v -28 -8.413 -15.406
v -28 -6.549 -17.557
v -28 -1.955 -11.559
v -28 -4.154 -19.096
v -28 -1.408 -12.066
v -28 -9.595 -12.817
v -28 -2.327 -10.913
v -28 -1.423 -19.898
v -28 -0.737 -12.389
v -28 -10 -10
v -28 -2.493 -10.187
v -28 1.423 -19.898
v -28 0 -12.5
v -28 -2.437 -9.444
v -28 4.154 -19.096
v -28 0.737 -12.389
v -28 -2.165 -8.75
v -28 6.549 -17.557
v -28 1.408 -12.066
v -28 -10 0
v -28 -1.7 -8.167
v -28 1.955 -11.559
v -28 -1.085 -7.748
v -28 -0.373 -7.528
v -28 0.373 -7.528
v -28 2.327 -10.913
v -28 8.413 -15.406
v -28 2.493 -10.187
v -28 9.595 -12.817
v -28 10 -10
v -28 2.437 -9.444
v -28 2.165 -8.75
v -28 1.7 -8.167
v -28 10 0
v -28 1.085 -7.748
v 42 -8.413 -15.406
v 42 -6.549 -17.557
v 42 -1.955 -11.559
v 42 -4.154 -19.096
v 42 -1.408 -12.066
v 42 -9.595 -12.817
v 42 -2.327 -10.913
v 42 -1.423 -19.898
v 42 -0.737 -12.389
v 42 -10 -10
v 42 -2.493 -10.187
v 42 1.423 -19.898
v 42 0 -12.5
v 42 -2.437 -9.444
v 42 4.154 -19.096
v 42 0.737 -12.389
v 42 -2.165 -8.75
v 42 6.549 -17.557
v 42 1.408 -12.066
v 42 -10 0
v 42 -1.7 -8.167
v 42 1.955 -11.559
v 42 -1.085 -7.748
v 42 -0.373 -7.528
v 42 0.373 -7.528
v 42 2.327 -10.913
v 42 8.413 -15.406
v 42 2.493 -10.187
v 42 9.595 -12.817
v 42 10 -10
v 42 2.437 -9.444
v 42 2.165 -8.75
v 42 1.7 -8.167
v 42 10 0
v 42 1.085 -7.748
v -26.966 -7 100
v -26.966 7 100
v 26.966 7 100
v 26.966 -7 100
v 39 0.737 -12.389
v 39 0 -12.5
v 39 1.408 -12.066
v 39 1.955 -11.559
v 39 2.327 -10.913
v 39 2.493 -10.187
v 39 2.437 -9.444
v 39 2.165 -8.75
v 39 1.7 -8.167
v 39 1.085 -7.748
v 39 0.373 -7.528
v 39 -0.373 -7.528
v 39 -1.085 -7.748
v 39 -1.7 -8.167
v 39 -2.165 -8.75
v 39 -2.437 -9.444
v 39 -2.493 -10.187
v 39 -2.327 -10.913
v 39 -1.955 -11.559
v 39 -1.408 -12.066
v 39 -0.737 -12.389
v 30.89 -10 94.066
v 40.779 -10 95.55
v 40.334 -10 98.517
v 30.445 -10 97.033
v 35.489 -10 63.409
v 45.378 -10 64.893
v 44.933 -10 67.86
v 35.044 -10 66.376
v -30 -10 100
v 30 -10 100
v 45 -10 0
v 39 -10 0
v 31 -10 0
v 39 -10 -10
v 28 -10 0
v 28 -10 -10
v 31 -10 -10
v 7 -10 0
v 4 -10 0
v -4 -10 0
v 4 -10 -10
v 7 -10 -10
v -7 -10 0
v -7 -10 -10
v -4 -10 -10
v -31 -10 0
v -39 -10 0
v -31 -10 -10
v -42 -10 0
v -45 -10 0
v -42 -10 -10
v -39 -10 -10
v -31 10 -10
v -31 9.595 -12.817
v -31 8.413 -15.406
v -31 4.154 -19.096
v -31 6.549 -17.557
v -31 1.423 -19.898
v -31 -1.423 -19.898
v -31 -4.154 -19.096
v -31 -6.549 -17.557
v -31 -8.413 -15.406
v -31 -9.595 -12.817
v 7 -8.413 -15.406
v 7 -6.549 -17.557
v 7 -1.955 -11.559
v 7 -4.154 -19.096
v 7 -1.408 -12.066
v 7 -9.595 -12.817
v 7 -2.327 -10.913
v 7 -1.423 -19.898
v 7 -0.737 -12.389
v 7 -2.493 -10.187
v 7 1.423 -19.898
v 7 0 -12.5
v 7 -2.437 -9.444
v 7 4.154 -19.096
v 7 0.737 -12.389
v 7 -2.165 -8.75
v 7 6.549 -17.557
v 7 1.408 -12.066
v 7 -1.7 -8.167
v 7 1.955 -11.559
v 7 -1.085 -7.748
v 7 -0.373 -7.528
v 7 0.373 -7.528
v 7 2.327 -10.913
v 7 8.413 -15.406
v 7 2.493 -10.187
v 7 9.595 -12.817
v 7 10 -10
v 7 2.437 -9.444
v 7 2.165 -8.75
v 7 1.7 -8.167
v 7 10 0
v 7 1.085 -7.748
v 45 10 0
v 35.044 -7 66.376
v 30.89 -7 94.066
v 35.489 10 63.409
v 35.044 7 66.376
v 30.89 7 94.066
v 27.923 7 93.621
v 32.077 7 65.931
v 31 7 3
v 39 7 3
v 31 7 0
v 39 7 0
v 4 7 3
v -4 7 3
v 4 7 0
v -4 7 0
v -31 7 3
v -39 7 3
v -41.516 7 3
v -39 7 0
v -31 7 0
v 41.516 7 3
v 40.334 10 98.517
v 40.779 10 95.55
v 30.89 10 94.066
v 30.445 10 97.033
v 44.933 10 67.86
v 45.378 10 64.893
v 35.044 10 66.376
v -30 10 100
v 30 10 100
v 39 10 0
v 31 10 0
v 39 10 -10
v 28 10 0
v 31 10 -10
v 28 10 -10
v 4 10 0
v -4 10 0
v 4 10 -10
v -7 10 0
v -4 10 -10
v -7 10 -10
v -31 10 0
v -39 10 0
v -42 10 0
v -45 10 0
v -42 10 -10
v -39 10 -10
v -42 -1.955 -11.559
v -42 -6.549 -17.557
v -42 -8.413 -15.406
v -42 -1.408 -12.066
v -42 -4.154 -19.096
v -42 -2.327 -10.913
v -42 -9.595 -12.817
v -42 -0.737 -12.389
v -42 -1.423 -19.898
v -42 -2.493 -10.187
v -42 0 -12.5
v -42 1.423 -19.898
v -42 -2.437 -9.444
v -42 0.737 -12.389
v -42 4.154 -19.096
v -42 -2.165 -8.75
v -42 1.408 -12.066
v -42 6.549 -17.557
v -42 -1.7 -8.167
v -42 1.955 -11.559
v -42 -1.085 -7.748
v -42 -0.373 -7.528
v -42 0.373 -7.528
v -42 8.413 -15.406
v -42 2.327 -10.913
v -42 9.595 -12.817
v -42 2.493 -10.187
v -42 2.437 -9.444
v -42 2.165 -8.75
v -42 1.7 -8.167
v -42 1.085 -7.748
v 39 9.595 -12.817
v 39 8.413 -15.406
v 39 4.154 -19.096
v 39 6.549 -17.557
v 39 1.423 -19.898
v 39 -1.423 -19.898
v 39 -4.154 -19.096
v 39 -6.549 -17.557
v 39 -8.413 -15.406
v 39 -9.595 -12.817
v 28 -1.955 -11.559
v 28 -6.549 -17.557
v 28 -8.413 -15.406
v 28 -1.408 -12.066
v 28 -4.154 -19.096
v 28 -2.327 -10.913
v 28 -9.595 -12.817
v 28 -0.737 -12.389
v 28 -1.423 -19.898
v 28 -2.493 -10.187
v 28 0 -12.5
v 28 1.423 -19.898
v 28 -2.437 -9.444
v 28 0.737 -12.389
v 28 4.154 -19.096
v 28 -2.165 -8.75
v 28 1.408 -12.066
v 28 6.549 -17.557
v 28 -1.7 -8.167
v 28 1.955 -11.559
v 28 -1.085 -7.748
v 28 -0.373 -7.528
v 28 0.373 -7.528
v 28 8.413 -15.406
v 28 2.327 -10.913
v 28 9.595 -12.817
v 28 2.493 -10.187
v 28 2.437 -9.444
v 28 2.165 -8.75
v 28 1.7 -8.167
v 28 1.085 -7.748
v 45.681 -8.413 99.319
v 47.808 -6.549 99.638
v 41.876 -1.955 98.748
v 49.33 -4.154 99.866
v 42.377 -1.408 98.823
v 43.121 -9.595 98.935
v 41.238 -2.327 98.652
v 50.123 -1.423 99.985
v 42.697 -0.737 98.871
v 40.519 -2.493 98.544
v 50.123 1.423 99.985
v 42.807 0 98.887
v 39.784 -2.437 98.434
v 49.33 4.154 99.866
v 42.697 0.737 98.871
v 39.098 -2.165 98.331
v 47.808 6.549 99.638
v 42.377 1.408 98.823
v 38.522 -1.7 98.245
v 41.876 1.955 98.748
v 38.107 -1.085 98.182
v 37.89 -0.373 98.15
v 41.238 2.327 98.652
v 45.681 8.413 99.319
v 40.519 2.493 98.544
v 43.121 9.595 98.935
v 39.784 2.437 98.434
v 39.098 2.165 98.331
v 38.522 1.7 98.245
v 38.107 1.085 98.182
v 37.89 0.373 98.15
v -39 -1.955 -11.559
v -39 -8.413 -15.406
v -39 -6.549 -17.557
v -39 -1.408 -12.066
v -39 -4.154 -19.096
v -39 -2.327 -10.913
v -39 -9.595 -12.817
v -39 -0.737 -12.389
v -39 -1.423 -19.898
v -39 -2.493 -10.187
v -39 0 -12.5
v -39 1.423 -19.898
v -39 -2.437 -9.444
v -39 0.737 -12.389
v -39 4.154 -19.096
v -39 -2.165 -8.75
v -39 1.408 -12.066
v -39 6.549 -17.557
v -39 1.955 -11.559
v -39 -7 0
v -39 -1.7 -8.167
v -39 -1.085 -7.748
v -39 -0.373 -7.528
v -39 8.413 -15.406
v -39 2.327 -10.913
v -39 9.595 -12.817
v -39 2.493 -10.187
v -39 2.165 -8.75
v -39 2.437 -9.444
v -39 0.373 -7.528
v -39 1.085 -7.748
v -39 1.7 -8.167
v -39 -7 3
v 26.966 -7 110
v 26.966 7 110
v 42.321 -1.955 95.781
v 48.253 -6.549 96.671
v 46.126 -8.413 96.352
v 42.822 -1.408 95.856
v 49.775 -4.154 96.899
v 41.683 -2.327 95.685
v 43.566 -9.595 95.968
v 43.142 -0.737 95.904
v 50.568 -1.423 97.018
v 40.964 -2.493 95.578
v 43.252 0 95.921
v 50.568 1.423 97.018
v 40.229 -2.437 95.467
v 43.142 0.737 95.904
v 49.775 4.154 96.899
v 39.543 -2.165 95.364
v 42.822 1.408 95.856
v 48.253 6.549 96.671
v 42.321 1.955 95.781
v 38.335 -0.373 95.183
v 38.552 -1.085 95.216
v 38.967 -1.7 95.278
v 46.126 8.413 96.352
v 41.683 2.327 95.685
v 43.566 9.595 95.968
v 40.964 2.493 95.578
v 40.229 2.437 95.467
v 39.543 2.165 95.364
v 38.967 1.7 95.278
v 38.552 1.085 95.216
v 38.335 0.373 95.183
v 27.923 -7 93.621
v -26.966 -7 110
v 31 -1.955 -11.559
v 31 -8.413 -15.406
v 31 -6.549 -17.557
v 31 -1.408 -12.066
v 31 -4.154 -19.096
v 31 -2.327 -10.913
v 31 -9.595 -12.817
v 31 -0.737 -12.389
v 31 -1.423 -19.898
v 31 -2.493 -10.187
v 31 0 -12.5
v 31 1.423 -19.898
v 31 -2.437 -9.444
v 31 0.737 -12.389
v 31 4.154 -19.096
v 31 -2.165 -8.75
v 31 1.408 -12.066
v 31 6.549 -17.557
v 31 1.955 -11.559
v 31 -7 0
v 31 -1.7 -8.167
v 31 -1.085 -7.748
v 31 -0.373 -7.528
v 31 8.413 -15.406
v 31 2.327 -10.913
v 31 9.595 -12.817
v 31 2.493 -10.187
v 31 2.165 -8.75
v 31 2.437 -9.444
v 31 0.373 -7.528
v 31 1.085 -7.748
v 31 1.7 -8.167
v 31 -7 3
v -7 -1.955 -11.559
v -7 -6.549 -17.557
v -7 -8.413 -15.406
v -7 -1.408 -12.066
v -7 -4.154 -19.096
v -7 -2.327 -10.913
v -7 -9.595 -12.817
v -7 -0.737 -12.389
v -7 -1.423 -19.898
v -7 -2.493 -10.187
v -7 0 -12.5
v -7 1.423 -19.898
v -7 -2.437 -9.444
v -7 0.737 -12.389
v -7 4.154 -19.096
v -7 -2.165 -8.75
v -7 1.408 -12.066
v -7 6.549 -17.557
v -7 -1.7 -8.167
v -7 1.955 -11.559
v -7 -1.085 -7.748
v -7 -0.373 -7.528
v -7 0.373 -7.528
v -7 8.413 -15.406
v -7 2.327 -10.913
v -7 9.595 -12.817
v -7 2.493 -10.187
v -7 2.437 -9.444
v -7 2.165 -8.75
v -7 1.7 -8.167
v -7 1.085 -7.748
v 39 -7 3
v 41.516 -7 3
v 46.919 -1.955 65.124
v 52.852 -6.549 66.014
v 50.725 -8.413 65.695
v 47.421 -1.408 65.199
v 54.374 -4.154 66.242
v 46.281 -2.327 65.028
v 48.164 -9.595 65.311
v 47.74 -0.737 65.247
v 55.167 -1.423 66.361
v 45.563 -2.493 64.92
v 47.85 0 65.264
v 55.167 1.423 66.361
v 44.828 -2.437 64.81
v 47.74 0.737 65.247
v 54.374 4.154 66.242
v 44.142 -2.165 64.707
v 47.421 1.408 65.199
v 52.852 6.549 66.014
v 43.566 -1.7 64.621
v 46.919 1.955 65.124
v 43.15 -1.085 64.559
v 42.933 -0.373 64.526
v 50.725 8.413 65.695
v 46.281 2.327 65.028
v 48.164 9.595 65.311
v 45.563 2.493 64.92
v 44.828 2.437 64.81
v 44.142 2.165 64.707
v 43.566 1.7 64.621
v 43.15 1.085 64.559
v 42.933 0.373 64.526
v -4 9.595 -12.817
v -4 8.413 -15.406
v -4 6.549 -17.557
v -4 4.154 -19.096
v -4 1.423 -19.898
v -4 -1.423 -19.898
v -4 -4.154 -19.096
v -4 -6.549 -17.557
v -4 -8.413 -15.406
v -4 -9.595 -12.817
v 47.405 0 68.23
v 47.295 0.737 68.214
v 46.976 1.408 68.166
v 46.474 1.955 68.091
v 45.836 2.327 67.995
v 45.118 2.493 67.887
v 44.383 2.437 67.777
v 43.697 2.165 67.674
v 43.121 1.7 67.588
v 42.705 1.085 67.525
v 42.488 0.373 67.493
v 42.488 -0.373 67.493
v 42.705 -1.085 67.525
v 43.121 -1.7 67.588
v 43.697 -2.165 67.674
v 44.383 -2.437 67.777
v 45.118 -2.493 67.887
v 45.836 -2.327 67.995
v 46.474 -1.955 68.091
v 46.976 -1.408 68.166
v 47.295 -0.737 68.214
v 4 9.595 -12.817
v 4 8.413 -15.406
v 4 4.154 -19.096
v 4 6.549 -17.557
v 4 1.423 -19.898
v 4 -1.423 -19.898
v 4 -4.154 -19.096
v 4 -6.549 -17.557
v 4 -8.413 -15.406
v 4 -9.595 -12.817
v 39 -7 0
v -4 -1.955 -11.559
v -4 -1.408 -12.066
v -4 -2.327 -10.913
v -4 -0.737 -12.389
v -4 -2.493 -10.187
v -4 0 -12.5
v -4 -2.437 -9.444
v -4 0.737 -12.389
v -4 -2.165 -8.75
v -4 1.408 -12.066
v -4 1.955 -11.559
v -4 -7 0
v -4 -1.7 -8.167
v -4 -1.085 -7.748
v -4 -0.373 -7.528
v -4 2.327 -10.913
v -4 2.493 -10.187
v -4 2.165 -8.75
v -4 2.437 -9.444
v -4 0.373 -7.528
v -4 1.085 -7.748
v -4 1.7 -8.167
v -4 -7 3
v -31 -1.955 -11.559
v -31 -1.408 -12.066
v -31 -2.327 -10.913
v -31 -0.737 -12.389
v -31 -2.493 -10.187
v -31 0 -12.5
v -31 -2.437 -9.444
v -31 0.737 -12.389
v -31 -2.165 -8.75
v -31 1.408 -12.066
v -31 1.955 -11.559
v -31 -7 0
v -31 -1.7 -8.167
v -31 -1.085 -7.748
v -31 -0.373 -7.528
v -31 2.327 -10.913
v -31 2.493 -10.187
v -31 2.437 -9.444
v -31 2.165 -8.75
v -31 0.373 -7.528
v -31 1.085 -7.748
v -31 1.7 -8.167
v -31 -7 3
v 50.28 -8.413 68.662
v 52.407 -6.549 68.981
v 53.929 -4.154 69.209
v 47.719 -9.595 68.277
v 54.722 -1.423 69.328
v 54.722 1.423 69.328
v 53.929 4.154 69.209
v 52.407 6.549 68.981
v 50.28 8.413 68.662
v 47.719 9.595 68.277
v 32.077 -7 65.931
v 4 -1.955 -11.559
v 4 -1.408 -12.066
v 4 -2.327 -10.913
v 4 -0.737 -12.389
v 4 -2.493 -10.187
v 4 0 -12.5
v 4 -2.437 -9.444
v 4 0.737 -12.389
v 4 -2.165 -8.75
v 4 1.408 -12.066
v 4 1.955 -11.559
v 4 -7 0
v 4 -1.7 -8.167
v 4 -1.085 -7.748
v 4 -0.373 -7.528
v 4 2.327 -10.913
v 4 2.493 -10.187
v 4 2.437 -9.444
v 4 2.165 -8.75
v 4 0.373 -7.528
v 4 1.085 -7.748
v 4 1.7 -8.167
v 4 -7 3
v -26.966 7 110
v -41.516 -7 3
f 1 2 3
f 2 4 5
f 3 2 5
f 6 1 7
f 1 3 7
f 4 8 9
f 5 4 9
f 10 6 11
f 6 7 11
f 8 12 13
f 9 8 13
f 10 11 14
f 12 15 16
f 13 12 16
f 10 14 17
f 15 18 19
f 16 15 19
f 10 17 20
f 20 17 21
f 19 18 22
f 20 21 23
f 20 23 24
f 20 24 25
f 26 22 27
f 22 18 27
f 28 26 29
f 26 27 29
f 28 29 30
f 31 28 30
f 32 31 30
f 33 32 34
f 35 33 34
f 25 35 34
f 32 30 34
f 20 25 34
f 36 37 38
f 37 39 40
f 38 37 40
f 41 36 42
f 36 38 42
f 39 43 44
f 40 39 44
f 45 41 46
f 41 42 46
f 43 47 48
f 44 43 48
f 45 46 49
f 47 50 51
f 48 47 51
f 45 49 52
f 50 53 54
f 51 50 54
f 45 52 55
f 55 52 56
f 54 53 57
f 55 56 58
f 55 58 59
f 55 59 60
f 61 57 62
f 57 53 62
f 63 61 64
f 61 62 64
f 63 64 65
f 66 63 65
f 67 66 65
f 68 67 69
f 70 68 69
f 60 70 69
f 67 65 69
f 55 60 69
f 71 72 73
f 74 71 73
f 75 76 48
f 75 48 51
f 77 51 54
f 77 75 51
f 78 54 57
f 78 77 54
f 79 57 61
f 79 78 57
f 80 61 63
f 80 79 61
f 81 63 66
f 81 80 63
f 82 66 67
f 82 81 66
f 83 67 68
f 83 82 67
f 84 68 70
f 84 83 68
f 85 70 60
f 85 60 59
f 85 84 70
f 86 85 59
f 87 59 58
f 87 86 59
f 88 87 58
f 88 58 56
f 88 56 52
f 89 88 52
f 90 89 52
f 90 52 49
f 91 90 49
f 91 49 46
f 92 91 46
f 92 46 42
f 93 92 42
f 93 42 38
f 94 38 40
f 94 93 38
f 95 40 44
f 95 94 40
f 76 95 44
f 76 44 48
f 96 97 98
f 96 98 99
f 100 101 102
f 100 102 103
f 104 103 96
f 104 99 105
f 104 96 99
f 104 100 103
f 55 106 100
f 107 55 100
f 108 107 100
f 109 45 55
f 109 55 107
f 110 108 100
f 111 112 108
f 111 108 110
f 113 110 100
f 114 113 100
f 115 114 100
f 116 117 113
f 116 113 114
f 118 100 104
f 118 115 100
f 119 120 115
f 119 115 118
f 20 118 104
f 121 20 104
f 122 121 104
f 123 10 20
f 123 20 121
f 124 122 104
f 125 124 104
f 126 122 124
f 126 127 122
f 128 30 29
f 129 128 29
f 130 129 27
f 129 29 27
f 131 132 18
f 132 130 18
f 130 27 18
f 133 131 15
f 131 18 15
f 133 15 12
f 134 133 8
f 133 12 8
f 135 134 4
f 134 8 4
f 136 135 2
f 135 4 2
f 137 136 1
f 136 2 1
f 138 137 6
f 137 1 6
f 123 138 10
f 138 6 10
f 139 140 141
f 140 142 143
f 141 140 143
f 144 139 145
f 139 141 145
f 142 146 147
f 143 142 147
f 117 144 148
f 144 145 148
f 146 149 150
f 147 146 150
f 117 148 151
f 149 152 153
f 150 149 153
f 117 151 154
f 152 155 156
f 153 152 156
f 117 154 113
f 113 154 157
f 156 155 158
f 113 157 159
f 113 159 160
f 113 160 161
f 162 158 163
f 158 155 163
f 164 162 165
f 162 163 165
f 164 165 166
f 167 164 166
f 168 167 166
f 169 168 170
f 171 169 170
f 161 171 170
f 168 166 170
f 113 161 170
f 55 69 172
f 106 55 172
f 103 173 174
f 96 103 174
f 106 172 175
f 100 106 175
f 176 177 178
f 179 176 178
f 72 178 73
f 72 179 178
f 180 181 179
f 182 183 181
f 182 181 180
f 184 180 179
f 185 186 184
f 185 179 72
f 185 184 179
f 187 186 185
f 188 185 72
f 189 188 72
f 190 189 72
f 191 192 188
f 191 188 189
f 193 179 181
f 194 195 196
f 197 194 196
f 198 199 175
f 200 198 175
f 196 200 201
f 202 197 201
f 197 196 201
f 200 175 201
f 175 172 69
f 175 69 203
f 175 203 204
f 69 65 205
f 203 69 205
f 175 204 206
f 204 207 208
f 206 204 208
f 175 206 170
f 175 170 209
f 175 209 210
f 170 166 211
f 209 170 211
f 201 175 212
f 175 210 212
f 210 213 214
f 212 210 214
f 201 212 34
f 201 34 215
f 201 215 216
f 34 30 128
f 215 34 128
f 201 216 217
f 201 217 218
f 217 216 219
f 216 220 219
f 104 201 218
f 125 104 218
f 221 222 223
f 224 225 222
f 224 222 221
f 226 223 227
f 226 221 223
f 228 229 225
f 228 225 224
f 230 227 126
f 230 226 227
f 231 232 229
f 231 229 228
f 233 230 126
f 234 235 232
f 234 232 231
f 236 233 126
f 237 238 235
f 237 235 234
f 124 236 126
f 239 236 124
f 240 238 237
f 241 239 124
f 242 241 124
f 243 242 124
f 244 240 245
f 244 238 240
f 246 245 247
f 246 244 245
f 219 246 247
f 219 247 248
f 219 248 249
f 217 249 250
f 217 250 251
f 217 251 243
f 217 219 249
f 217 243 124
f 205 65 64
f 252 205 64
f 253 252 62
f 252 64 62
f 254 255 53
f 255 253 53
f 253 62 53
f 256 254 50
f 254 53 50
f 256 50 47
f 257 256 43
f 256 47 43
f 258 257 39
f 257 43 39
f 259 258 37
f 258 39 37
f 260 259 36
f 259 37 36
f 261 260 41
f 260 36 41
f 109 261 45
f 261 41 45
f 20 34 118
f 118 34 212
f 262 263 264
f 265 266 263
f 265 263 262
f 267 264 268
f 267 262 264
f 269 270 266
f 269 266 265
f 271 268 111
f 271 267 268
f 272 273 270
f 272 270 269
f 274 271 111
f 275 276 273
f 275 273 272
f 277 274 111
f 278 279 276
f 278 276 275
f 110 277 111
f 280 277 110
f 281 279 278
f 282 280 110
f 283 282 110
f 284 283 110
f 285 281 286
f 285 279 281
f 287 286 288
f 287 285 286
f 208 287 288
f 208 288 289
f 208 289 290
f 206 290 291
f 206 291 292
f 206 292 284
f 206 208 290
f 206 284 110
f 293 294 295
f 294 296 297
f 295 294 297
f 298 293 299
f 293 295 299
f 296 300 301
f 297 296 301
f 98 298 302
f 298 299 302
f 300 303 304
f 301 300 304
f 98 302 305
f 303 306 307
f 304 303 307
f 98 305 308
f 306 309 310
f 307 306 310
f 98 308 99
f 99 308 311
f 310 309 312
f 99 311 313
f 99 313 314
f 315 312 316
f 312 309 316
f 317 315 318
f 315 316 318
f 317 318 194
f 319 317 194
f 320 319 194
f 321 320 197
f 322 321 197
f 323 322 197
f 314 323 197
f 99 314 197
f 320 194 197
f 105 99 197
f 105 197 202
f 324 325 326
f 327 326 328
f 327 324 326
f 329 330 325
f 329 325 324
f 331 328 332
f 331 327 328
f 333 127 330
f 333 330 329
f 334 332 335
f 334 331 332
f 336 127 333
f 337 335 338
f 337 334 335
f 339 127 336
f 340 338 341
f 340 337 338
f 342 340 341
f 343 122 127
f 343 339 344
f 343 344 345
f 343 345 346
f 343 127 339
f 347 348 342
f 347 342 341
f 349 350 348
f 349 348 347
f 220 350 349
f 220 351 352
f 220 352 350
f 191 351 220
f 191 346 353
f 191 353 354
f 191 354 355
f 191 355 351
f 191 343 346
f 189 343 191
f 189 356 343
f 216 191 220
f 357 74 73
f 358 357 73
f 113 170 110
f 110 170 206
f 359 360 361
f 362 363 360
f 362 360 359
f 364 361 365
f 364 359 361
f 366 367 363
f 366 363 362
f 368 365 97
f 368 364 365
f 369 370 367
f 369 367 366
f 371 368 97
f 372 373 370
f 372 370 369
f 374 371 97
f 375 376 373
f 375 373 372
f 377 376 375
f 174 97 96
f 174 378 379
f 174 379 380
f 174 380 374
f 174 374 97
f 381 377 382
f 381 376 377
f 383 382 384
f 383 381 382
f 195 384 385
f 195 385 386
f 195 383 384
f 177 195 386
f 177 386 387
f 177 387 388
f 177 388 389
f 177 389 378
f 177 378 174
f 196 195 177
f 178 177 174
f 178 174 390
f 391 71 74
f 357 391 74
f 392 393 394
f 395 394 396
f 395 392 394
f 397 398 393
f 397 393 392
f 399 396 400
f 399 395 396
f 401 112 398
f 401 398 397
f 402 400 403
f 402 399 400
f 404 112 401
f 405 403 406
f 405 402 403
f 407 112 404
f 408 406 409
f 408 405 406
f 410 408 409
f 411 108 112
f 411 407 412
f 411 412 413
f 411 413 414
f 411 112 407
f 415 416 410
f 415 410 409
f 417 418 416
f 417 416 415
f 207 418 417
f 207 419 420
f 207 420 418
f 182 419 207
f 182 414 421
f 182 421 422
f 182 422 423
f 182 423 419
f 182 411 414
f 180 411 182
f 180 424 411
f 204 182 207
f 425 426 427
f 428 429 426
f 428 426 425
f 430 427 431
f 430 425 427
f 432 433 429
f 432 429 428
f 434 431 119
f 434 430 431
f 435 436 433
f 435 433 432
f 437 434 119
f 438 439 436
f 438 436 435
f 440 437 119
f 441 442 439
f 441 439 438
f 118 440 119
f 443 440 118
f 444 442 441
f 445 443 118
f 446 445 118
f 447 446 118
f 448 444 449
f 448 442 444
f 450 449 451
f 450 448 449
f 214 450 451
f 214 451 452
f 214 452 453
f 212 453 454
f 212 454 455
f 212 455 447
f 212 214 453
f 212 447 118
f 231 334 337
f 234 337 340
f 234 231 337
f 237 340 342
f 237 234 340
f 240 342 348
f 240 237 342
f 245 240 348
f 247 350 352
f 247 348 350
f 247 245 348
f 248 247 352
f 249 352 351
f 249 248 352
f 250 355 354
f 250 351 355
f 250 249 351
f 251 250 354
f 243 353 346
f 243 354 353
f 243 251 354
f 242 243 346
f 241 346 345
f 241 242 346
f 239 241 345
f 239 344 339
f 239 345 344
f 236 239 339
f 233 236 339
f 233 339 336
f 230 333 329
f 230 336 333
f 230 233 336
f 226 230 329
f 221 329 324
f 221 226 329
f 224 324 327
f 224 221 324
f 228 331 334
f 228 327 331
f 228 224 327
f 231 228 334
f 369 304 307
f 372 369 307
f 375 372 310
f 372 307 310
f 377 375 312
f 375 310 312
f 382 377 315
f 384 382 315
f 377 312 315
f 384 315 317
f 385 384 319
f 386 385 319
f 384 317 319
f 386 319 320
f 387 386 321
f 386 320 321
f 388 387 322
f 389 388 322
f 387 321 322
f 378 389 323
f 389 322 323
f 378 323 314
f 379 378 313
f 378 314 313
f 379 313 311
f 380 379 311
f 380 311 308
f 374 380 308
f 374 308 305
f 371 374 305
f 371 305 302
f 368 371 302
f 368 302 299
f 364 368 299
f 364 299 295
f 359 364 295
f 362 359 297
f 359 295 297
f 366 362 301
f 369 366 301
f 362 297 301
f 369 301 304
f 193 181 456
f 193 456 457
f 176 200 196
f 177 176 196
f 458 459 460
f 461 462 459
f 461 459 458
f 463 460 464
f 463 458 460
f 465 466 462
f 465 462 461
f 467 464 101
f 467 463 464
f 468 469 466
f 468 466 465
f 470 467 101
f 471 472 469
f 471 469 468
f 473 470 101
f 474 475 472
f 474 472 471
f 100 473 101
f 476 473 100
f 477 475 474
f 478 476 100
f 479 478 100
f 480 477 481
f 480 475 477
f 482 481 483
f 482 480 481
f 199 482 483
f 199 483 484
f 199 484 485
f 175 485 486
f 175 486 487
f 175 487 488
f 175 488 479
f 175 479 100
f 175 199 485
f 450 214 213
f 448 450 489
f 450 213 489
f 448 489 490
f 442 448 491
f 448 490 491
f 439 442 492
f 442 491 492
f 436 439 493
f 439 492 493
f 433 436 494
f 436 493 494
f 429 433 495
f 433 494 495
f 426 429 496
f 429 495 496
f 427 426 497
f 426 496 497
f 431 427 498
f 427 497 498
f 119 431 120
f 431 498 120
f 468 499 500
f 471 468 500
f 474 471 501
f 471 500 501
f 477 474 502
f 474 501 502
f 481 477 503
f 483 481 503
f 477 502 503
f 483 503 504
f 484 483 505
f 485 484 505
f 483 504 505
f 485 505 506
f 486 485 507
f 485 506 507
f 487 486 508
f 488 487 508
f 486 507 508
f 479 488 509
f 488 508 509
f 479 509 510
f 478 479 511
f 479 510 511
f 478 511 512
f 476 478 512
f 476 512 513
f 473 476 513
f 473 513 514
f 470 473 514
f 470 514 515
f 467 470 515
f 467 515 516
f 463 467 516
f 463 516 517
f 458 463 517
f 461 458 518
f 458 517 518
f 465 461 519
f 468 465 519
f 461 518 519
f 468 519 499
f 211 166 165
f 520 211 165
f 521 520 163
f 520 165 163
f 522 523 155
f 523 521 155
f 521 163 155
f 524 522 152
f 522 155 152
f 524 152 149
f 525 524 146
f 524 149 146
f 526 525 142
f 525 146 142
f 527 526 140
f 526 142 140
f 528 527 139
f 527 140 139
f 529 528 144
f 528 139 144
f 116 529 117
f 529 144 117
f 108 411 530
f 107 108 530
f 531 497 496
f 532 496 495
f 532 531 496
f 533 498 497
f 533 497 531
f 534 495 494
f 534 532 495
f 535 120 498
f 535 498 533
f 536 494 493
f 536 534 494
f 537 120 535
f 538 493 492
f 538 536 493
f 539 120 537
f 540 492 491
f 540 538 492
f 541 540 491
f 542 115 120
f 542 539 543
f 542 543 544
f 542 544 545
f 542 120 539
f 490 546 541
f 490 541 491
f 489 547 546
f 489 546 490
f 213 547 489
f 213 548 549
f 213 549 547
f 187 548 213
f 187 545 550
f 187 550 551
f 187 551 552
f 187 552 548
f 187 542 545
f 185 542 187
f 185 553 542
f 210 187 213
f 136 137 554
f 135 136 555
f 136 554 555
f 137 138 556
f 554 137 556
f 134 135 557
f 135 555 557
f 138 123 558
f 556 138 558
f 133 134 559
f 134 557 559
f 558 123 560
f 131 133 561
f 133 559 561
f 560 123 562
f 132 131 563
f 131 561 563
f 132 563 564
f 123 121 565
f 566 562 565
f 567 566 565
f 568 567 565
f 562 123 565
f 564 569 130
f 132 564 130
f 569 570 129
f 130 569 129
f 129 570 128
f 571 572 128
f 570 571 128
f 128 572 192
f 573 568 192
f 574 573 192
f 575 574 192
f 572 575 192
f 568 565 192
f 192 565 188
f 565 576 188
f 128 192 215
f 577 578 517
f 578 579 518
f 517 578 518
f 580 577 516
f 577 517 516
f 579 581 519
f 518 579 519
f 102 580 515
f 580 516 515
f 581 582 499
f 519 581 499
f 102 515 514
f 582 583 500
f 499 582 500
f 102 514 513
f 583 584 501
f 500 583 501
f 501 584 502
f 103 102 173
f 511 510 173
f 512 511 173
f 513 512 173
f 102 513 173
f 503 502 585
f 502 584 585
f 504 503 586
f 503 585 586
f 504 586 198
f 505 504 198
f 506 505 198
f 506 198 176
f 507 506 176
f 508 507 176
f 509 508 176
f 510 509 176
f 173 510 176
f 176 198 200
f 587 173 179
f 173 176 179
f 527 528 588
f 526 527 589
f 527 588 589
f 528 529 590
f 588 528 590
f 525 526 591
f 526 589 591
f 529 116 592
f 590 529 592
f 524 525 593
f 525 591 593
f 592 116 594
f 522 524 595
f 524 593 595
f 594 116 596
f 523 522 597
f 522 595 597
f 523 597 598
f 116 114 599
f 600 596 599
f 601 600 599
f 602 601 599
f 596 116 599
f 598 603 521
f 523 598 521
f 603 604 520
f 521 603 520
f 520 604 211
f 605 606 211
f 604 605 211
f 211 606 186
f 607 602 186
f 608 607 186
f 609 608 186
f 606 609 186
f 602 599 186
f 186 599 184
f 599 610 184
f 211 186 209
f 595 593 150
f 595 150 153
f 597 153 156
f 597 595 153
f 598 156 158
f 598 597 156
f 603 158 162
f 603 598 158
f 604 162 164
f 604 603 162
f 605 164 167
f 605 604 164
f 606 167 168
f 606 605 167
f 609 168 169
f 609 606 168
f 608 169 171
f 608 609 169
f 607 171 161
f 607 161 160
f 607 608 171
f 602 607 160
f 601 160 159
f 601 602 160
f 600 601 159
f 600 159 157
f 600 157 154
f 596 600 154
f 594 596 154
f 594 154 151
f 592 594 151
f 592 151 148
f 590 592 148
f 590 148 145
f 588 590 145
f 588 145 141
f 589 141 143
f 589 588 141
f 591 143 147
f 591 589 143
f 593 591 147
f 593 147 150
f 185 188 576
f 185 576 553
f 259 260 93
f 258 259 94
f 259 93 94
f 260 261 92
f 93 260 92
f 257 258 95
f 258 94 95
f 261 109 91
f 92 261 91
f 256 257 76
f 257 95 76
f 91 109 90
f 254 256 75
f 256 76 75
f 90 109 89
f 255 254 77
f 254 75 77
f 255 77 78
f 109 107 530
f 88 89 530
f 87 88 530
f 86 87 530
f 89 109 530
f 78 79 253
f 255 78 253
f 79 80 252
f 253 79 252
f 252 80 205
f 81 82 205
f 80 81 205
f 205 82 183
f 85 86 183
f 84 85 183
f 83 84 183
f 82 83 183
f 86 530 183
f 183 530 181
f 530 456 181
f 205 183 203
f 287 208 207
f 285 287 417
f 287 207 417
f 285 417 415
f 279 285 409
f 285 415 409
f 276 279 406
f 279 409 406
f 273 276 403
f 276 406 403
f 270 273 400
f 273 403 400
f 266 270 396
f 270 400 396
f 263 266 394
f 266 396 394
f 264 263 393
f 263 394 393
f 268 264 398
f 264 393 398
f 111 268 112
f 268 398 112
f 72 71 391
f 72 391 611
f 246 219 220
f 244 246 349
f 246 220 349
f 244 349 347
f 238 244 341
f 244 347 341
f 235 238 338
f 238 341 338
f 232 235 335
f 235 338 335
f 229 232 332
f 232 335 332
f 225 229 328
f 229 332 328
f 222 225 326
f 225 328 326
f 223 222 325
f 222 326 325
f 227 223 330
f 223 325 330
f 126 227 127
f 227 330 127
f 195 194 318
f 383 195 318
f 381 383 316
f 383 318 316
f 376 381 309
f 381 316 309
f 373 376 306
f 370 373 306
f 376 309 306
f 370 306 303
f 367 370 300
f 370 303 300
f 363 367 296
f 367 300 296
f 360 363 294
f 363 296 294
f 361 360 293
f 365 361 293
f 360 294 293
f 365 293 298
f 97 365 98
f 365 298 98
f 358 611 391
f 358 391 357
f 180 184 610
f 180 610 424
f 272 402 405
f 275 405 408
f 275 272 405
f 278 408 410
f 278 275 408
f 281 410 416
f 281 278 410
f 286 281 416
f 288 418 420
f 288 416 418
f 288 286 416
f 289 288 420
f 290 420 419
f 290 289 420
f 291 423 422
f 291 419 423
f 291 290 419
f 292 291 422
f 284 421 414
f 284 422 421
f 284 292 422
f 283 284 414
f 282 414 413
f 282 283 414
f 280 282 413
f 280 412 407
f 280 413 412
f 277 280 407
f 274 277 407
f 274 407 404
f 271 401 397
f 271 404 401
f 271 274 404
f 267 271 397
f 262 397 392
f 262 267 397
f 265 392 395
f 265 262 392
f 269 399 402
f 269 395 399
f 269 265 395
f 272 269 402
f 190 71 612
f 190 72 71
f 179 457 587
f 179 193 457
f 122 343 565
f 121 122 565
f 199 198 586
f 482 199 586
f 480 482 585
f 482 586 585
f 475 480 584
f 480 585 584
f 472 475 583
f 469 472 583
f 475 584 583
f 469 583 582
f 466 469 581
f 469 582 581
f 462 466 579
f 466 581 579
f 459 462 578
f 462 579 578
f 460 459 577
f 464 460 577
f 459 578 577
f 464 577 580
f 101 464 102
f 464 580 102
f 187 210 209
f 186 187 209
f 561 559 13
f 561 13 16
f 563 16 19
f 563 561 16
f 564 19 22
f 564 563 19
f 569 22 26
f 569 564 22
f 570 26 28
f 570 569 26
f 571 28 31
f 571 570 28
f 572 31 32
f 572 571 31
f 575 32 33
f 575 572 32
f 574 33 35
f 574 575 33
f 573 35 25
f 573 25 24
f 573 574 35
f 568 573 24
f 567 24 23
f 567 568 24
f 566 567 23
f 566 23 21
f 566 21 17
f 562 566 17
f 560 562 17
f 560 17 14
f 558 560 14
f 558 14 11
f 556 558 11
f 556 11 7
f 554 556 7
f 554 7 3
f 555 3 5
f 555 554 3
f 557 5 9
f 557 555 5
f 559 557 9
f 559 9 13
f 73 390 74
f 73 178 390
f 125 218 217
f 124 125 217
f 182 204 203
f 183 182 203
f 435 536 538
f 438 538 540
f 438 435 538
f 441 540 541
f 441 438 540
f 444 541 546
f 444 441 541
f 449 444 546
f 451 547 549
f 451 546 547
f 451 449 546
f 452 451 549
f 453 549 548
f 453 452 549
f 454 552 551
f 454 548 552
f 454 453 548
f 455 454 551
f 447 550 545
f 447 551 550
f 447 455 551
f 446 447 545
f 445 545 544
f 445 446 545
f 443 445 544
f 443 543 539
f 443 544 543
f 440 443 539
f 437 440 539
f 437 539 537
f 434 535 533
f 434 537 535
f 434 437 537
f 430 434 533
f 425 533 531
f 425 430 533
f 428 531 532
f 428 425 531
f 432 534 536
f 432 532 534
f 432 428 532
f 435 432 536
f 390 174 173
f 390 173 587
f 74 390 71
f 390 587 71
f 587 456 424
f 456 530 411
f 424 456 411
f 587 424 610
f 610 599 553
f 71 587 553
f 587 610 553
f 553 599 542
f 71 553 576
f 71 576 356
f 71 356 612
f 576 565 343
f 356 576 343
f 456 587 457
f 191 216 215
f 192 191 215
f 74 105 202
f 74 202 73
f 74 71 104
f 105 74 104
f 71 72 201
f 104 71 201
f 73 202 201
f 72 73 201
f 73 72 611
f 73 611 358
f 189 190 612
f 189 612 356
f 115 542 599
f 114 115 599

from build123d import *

# Parameters (mm, degrees)
BOSS_EXTRUDE1_DEPTH = 10
BOSS_EXTRUDE2_START = 35
SKETCH2_R           = 2.5
BOSS_EXTRUDE2_DEPTH = 7
LPATTERN1_COUNT     = 3
LPATTERN1_PITCH     = 35
SHELL1_T            = -3
SKETCH3_W           = 8
SKETCH3_H           = 20
CUT_EXTRUDE1_DEPTH  = 20
BOSS_EXTRUDE3_START = -3
SKETCH5_R           = 2.5
BOSS_EXTRUDE3_DEPTH = 3
LPATTERN2_COUNT     = 2
LPATTERN2_PITCH     = 31
SKETCH6_W           = 28
SKETCH6_H           = 14
CUT_EXTRUDE2_DEPTH  = 3
SKETCH7_W           = 53.932875476
SKETCH7_H           = 14
BOSS_EXTRUDE4_DEPTH = 10


with BuildPart() as part:
    # Sketch1 → Boss-Extrude1 (new body, symmetric)
    with BuildSketch(Plane(origin=(0, 0, 0), x_dir=(1, 0, 0), z_dir=(0, 1, 0))):
        Polygon((-45, 0), (45, 0), (30, -100), (-30, -100), align=None)
    extrude(amount=BOSS_EXTRUDE1_DEPTH, both=True)

    # Sketch2 → Boss-Extrude2 (add, symmetric)
    with BuildSketch(Plane(origin=(0, 0, 0), x_dir=(0, 0, -1), z_dir=(1, 0, 0)).offset(BOSS_EXTRUDE2_START)):
        with BuildLine():
            Line((0, 10), (10, 10))
            ThreePointArc((10, 10), (20, 0), (10, -10))
            Line((10, -10), (0, -10))
            Line((0, -10), (0, 10))
        make_face()
        with Locations((10, 0)):
            Circle(SKETCH2_R, mode=Mode.SUBTRACT)
    boss_extrude2 = extrude(amount=BOSS_EXTRUDE2_DEPTH, both=True)

    # LPattern1: Boss-Extrude2 ×3
    with Locations(*[(-i * LPATTERN1_PITCH, 0, 0) for i in range(1, LPATTERN1_COUNT)]):
        add(boss_extrude2)

    # Shell1
    shell1_openings = [part.faces().sort_by_distance(p)[0] for p in [
        (0, 0, 100),
    ]]
    offset(amount=SHELL1_T, openings=shell1_openings, kind=Kind.INTERSECTION)

    # Sketch3 → Cut-Extrude1 (cut)
    with BuildSketch(Plane.XY):
        with Locations((35, 0)):
            Rectangle(SKETCH3_W, SKETCH3_H)
        Rectangle(SKETCH3_W, SKETCH3_H)
        with Locations((-35, 0)):
            Rectangle(SKETCH3_W, SKETCH3_H)
    extrude(amount=-CUT_EXTRUDE1_DEPTH, mode=Mode.SUBTRACT)

    # Sketch5 → Boss-Extrude3 (add)
    with BuildSketch(Plane(origin=(-14.009779951, 0, 93.398533007), x_dir=(0.988936353, 0, 0.148340453), z_dir=(-0.148340453, 0, 0.988936353)).offset(BOSS_EXTRUDE3_START)):
        with BuildLine():
            Line((44.502135879, 10), (54.502135879, 10))
            ThreePointArc((54.502135879, 10), (64.502135879, 0), (54.502135879, -10))
            Line((54.502135879, -10), (44.502135879, -10))
            Line((44.502135879, -10), (44.502135879, 10))
        make_face()
        with Locations((54.502135879, 0)):
            Circle(SKETCH5_R, mode=Mode.SUBTRACT)
    boss_extrude3 = extrude(amount=-BOSS_EXTRUDE3_DEPTH)

    # LPattern2: Boss-Extrude3 ×2
    with Locations(*[Vector(0.148340453, 0, -0.988936353) * (i * LPATTERN2_PITCH) for i in range(1, LPATTERN2_COUNT)]):
        add(boss_extrude3)

    # Sketch6 → Cut-Extrude2 (cut)
    with BuildSketch(Plane(origin=(44.009779951, 0, 6.601466993), x_dir=(0.148340453, 0, -0.988936353), z_dir=(0.988936353, 0, 0.148340453))):
        with Locations((-74.443421699, 0)):
            Rectangle(SKETCH6_W, SKETCH6_H)
    extrude(amount=-CUT_EXTRUDE2_DEPTH, mode=Mode.SUBTRACT)


with BuildPart() as body_2:
    # Sketch7 → Boss-Extrude4 (new body)
    with BuildSketch(Plane.XY.offset(100)):
        Rectangle(SKETCH7_W, SKETCH7_H)
    extrude(amount=BOSS_EXTRUDE4_DEPTH)


solid = Compound([part.part, body_2.part])
